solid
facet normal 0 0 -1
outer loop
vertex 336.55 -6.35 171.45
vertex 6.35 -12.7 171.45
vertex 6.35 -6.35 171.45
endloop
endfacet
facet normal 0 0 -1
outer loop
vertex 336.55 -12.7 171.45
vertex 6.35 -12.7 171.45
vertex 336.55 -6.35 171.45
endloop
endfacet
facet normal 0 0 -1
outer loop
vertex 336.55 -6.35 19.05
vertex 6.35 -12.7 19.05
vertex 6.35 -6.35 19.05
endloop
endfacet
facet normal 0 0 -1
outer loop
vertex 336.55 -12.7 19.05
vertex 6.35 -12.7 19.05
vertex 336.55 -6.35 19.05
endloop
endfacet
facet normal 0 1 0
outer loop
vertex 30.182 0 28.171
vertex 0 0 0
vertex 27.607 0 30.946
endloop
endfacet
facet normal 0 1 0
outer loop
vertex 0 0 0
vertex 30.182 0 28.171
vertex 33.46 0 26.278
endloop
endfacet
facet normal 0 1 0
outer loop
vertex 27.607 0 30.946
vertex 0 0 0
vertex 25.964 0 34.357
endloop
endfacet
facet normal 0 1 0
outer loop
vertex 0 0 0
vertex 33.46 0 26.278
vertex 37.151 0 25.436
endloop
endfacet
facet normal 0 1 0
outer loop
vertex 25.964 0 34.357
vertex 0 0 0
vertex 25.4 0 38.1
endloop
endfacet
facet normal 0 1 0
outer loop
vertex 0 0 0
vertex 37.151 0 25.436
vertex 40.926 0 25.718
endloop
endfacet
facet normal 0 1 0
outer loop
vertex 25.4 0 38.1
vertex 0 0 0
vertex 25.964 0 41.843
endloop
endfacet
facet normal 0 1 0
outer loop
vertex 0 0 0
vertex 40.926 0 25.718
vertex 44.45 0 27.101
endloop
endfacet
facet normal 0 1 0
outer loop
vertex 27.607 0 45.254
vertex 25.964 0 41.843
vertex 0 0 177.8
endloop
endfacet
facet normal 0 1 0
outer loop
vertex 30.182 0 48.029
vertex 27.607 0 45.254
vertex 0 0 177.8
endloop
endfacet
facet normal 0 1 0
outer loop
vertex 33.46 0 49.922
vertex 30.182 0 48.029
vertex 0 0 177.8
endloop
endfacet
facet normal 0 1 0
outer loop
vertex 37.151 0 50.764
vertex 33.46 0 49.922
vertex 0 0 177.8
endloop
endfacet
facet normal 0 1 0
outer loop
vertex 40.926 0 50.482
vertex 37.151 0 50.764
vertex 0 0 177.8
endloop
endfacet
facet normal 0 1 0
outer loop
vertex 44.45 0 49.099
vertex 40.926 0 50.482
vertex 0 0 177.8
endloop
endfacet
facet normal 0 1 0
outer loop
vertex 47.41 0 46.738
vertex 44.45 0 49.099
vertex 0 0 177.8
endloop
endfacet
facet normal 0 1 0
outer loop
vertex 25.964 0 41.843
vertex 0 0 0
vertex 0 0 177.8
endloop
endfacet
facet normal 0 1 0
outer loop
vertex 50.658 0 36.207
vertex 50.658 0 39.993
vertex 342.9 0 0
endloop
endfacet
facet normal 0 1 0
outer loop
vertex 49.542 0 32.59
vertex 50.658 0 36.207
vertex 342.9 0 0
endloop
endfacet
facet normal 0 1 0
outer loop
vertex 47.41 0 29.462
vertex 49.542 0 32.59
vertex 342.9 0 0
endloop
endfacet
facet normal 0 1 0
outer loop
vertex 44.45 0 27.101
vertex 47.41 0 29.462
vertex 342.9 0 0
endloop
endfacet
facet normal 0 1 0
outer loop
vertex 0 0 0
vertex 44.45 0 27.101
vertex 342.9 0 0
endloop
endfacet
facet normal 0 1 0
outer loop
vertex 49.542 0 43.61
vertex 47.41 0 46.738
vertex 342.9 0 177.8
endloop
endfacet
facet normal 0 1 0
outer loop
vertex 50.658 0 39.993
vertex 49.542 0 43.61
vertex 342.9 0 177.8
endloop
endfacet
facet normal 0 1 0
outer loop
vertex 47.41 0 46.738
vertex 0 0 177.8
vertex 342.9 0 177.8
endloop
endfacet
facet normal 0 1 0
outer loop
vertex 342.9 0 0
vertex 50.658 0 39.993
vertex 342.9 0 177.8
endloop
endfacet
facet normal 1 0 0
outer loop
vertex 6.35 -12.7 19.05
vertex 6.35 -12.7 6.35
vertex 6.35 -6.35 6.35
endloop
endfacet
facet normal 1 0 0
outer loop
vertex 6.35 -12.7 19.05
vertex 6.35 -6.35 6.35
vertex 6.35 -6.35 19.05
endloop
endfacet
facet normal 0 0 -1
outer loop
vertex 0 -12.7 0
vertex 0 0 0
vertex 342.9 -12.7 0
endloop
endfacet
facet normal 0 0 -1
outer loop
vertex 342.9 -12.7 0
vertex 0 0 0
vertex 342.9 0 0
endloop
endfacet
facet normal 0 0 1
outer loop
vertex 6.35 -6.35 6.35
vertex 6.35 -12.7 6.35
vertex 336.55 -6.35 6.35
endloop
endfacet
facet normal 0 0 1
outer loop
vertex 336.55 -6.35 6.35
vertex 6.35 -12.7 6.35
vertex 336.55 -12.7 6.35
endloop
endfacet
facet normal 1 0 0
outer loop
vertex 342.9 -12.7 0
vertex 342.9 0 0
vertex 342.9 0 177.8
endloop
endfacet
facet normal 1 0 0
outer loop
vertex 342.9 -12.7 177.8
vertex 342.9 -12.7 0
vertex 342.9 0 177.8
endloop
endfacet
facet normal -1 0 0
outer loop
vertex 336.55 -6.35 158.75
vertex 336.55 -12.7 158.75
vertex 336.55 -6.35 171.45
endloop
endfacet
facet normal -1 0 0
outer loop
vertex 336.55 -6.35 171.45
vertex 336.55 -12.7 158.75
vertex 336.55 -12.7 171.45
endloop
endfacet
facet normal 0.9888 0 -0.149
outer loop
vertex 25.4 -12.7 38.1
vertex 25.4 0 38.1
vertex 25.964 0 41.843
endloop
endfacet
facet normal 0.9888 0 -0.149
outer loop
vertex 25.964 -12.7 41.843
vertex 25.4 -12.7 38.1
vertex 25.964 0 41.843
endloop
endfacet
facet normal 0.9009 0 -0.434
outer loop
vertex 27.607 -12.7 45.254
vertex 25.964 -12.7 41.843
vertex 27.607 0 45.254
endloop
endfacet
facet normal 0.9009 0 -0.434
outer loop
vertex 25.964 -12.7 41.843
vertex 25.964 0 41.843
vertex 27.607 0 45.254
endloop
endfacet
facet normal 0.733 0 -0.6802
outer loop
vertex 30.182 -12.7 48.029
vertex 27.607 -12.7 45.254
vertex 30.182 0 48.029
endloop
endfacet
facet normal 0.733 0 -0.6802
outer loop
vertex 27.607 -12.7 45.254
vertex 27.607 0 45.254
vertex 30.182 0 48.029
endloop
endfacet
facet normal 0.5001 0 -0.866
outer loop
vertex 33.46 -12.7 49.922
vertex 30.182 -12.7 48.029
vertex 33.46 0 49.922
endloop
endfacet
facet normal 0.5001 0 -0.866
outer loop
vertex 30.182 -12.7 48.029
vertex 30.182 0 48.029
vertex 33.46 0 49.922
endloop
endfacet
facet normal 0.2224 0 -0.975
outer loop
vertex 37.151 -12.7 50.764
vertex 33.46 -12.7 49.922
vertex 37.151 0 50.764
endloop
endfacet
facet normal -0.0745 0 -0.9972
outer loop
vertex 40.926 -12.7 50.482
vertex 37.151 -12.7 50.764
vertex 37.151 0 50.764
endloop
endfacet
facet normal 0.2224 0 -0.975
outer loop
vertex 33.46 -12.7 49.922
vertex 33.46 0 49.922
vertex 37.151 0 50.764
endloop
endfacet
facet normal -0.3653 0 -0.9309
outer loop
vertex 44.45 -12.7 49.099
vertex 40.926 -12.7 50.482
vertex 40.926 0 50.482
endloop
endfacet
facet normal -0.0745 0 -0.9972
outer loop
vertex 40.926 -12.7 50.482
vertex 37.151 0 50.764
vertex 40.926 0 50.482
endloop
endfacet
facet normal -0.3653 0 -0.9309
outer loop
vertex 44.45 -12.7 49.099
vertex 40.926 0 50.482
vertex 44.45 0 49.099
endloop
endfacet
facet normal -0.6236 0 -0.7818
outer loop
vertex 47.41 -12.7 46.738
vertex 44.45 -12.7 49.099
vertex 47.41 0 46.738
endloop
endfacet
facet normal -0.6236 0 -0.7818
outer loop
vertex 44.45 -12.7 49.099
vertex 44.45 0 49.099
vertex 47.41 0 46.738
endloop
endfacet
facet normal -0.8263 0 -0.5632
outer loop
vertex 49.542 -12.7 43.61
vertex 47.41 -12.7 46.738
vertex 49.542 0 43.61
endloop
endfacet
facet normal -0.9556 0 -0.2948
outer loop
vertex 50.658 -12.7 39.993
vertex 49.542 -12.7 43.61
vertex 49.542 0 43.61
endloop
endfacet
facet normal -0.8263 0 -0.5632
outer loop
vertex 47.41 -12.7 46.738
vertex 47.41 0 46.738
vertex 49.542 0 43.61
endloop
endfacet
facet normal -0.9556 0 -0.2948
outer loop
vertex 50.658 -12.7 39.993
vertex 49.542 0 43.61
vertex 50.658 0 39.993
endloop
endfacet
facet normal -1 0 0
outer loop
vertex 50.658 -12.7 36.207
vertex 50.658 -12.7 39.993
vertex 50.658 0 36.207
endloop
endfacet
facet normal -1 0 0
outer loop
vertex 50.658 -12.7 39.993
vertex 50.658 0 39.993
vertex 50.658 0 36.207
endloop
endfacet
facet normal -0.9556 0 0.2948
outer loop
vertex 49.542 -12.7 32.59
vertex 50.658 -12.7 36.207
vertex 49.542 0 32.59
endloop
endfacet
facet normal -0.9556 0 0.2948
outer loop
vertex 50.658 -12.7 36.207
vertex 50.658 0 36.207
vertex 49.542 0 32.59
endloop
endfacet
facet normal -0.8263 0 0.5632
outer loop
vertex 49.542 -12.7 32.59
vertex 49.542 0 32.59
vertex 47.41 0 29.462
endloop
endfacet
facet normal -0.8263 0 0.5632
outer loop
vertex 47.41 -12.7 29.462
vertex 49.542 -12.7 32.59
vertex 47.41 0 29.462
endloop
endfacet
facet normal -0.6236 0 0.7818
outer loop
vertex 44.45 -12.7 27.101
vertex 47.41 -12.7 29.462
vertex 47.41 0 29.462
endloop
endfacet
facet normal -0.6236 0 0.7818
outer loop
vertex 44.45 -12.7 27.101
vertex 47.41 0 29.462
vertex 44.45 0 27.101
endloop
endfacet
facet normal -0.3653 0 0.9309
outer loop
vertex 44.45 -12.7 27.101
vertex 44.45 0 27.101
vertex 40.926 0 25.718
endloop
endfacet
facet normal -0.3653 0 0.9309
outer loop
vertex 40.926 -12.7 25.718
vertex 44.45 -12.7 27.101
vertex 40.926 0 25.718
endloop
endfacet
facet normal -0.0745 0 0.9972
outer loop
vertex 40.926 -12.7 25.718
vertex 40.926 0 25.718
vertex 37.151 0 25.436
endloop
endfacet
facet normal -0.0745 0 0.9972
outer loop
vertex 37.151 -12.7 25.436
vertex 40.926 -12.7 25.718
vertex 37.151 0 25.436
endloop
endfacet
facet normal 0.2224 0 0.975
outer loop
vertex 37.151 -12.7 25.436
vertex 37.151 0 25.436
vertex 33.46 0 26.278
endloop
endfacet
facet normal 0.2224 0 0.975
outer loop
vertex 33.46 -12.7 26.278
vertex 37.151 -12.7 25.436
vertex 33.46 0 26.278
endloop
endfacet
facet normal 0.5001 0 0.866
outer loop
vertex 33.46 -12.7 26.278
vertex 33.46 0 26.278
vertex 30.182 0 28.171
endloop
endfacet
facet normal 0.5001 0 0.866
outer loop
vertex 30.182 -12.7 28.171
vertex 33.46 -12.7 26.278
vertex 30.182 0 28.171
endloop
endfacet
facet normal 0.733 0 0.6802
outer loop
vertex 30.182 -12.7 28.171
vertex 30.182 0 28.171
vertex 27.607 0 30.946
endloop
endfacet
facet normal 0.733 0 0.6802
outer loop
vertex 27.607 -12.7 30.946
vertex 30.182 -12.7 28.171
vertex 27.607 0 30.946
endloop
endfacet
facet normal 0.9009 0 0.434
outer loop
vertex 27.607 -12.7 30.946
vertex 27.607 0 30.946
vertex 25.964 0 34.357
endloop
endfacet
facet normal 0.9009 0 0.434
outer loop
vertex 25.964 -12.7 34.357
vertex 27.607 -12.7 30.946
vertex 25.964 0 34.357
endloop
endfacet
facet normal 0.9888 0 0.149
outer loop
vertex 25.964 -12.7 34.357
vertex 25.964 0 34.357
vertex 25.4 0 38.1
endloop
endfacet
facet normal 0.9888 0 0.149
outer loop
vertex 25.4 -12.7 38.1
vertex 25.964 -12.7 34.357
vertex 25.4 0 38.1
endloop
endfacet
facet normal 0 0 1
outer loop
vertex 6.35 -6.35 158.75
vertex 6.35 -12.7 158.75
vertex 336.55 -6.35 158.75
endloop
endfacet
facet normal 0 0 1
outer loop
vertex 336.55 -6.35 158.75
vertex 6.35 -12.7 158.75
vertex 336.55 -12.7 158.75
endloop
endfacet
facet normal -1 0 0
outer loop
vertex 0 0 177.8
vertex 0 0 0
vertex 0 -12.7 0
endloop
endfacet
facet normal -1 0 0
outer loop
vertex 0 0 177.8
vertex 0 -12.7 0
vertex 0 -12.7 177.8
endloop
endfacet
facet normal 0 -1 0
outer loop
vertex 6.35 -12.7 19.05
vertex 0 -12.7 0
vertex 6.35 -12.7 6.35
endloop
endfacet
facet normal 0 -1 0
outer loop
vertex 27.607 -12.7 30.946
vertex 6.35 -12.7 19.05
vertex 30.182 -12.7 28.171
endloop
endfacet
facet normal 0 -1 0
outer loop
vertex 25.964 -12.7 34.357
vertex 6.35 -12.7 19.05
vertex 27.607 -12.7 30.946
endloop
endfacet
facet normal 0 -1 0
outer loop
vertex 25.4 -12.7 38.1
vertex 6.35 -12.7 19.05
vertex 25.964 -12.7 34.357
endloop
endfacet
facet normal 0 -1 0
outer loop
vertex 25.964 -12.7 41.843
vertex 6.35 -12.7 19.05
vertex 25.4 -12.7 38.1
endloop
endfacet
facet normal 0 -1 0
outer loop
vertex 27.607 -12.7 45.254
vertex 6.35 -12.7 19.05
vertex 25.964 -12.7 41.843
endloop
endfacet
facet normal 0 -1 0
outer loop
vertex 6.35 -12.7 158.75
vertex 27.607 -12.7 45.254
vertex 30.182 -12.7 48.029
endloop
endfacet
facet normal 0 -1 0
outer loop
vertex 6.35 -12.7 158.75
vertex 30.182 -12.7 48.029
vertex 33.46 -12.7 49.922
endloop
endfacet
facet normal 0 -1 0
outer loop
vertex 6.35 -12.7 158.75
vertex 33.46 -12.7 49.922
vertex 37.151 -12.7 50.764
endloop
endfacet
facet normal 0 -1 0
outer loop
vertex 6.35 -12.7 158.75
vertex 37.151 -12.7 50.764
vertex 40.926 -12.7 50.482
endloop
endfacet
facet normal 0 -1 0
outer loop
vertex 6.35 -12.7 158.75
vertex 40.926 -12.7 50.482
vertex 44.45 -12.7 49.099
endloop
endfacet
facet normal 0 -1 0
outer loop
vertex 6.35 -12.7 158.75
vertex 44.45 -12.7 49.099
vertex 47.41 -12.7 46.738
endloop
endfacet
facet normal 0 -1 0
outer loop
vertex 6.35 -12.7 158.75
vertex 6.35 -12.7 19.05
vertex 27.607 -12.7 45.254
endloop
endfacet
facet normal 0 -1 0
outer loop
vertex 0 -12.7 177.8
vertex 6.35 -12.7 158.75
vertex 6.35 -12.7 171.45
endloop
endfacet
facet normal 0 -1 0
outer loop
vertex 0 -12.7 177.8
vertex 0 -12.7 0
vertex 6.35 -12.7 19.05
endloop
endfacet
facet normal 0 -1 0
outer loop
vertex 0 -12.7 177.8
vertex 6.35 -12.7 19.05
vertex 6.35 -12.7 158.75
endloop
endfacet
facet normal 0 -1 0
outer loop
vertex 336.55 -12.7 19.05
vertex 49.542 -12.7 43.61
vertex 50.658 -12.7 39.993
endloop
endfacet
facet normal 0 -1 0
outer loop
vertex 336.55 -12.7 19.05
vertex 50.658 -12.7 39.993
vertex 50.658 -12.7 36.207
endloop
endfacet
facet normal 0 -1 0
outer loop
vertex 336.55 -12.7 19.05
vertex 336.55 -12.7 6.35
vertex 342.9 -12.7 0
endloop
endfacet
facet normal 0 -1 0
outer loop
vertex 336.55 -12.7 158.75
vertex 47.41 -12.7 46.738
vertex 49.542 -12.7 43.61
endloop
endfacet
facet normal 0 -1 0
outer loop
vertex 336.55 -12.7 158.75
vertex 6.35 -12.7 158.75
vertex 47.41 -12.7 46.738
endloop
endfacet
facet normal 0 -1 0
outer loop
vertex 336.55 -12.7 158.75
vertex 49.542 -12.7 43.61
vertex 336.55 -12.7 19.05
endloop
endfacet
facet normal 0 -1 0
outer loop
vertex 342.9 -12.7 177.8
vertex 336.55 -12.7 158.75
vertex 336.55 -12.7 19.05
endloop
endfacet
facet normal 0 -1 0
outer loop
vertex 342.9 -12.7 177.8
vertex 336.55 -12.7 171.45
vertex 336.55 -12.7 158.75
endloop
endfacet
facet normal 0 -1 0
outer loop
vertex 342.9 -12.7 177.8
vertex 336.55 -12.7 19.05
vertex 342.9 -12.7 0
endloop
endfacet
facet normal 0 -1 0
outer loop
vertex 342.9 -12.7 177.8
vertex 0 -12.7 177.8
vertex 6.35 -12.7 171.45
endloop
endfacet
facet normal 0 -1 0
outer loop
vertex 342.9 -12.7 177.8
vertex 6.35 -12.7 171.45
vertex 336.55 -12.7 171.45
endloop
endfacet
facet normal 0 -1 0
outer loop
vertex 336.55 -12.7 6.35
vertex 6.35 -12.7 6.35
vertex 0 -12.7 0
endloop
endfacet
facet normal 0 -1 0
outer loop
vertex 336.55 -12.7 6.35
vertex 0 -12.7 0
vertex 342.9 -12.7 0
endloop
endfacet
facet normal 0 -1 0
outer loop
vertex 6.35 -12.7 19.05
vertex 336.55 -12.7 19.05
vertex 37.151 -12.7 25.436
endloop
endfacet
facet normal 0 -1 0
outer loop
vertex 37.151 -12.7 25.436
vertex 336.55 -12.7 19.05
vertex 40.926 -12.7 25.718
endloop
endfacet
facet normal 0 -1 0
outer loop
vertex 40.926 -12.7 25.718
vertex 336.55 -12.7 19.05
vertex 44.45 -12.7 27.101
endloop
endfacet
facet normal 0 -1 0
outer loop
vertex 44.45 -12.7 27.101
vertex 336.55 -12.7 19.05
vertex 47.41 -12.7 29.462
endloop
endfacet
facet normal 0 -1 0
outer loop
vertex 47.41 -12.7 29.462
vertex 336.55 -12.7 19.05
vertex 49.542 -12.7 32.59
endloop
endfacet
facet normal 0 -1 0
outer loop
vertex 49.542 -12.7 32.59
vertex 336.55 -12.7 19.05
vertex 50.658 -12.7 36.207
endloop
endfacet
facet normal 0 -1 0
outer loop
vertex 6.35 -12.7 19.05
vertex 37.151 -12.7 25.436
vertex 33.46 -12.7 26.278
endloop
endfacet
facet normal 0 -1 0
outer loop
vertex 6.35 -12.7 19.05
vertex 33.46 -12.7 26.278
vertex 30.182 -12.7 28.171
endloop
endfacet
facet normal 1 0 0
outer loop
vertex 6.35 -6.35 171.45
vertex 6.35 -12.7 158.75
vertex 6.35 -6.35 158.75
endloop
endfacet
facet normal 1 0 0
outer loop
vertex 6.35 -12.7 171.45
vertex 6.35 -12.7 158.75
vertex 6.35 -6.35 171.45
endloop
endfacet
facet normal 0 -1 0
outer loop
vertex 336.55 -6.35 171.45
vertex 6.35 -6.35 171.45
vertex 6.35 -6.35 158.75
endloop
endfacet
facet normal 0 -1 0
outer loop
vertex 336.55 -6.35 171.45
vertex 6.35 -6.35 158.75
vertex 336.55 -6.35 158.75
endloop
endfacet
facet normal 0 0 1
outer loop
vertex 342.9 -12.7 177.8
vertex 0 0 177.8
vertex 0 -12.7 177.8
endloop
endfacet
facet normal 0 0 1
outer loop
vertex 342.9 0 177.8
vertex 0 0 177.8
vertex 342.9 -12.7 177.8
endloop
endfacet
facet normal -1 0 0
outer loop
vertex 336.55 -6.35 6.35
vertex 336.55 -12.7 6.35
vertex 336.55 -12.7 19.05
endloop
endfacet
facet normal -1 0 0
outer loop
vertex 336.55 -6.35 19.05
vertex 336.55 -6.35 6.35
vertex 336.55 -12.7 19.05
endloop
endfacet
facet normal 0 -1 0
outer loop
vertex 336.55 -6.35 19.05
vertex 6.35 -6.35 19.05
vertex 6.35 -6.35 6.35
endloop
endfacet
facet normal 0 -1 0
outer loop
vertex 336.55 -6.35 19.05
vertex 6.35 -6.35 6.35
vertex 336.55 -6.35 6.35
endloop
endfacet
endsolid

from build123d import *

# Parameters (mm, degrees)
F0_W     = 342.9
F0_H     = 177.8
F1_DEPTH = 12.7
F2_W     = 330.2
F2_H     = 12.7
F3_DEPTH = 6.35
F4_W     = 330.2
F4_H     = 12.7
F5_DEPTH = 6.35
F6_R     = 12.7
F7_DEPTH = 25.4


with BuildPart() as f1:
    # F0 (on Front) → F1 (new body)
    with BuildSketch(Plane.XZ):
        with Locations((171.45, 88.9)):
            Rectangle(F0_W, F0_H)
    extrude(amount=F1_DEPTH)

    # F2 (on face) → F3 (cut)
    with BuildSketch(Plane.XZ.offset(12.7)):
        with Locations((171.45, 12.7)):
            Rectangle(F2_W, F2_H)
    extrude(amount=-F3_DEPTH, mode=Mode.SUBTRACT)

    # F4 (on face) → F5 (cut)
    with BuildSketch(Plane.XZ.offset(12.7)):
        with Locations((171.45, 165.1)):
            Rectangle(F4_W, F4_H)
    extrude(amount=-F5_DEPTH, mode=Mode.SUBTRACT)

    # F6 (on face) → F7 (cut)
    with BuildSketch(Plane(origin=(0, 0, 0), x_dir=(-1, 0, 0), z_dir=(0, 1, 0))):
        with Locations((-38.1, 38.1)):
            Circle(F6_R)
    extrude(amount=-F7_DEPTH, mode=Mode.SUBTRACT)


solid = f1.part
